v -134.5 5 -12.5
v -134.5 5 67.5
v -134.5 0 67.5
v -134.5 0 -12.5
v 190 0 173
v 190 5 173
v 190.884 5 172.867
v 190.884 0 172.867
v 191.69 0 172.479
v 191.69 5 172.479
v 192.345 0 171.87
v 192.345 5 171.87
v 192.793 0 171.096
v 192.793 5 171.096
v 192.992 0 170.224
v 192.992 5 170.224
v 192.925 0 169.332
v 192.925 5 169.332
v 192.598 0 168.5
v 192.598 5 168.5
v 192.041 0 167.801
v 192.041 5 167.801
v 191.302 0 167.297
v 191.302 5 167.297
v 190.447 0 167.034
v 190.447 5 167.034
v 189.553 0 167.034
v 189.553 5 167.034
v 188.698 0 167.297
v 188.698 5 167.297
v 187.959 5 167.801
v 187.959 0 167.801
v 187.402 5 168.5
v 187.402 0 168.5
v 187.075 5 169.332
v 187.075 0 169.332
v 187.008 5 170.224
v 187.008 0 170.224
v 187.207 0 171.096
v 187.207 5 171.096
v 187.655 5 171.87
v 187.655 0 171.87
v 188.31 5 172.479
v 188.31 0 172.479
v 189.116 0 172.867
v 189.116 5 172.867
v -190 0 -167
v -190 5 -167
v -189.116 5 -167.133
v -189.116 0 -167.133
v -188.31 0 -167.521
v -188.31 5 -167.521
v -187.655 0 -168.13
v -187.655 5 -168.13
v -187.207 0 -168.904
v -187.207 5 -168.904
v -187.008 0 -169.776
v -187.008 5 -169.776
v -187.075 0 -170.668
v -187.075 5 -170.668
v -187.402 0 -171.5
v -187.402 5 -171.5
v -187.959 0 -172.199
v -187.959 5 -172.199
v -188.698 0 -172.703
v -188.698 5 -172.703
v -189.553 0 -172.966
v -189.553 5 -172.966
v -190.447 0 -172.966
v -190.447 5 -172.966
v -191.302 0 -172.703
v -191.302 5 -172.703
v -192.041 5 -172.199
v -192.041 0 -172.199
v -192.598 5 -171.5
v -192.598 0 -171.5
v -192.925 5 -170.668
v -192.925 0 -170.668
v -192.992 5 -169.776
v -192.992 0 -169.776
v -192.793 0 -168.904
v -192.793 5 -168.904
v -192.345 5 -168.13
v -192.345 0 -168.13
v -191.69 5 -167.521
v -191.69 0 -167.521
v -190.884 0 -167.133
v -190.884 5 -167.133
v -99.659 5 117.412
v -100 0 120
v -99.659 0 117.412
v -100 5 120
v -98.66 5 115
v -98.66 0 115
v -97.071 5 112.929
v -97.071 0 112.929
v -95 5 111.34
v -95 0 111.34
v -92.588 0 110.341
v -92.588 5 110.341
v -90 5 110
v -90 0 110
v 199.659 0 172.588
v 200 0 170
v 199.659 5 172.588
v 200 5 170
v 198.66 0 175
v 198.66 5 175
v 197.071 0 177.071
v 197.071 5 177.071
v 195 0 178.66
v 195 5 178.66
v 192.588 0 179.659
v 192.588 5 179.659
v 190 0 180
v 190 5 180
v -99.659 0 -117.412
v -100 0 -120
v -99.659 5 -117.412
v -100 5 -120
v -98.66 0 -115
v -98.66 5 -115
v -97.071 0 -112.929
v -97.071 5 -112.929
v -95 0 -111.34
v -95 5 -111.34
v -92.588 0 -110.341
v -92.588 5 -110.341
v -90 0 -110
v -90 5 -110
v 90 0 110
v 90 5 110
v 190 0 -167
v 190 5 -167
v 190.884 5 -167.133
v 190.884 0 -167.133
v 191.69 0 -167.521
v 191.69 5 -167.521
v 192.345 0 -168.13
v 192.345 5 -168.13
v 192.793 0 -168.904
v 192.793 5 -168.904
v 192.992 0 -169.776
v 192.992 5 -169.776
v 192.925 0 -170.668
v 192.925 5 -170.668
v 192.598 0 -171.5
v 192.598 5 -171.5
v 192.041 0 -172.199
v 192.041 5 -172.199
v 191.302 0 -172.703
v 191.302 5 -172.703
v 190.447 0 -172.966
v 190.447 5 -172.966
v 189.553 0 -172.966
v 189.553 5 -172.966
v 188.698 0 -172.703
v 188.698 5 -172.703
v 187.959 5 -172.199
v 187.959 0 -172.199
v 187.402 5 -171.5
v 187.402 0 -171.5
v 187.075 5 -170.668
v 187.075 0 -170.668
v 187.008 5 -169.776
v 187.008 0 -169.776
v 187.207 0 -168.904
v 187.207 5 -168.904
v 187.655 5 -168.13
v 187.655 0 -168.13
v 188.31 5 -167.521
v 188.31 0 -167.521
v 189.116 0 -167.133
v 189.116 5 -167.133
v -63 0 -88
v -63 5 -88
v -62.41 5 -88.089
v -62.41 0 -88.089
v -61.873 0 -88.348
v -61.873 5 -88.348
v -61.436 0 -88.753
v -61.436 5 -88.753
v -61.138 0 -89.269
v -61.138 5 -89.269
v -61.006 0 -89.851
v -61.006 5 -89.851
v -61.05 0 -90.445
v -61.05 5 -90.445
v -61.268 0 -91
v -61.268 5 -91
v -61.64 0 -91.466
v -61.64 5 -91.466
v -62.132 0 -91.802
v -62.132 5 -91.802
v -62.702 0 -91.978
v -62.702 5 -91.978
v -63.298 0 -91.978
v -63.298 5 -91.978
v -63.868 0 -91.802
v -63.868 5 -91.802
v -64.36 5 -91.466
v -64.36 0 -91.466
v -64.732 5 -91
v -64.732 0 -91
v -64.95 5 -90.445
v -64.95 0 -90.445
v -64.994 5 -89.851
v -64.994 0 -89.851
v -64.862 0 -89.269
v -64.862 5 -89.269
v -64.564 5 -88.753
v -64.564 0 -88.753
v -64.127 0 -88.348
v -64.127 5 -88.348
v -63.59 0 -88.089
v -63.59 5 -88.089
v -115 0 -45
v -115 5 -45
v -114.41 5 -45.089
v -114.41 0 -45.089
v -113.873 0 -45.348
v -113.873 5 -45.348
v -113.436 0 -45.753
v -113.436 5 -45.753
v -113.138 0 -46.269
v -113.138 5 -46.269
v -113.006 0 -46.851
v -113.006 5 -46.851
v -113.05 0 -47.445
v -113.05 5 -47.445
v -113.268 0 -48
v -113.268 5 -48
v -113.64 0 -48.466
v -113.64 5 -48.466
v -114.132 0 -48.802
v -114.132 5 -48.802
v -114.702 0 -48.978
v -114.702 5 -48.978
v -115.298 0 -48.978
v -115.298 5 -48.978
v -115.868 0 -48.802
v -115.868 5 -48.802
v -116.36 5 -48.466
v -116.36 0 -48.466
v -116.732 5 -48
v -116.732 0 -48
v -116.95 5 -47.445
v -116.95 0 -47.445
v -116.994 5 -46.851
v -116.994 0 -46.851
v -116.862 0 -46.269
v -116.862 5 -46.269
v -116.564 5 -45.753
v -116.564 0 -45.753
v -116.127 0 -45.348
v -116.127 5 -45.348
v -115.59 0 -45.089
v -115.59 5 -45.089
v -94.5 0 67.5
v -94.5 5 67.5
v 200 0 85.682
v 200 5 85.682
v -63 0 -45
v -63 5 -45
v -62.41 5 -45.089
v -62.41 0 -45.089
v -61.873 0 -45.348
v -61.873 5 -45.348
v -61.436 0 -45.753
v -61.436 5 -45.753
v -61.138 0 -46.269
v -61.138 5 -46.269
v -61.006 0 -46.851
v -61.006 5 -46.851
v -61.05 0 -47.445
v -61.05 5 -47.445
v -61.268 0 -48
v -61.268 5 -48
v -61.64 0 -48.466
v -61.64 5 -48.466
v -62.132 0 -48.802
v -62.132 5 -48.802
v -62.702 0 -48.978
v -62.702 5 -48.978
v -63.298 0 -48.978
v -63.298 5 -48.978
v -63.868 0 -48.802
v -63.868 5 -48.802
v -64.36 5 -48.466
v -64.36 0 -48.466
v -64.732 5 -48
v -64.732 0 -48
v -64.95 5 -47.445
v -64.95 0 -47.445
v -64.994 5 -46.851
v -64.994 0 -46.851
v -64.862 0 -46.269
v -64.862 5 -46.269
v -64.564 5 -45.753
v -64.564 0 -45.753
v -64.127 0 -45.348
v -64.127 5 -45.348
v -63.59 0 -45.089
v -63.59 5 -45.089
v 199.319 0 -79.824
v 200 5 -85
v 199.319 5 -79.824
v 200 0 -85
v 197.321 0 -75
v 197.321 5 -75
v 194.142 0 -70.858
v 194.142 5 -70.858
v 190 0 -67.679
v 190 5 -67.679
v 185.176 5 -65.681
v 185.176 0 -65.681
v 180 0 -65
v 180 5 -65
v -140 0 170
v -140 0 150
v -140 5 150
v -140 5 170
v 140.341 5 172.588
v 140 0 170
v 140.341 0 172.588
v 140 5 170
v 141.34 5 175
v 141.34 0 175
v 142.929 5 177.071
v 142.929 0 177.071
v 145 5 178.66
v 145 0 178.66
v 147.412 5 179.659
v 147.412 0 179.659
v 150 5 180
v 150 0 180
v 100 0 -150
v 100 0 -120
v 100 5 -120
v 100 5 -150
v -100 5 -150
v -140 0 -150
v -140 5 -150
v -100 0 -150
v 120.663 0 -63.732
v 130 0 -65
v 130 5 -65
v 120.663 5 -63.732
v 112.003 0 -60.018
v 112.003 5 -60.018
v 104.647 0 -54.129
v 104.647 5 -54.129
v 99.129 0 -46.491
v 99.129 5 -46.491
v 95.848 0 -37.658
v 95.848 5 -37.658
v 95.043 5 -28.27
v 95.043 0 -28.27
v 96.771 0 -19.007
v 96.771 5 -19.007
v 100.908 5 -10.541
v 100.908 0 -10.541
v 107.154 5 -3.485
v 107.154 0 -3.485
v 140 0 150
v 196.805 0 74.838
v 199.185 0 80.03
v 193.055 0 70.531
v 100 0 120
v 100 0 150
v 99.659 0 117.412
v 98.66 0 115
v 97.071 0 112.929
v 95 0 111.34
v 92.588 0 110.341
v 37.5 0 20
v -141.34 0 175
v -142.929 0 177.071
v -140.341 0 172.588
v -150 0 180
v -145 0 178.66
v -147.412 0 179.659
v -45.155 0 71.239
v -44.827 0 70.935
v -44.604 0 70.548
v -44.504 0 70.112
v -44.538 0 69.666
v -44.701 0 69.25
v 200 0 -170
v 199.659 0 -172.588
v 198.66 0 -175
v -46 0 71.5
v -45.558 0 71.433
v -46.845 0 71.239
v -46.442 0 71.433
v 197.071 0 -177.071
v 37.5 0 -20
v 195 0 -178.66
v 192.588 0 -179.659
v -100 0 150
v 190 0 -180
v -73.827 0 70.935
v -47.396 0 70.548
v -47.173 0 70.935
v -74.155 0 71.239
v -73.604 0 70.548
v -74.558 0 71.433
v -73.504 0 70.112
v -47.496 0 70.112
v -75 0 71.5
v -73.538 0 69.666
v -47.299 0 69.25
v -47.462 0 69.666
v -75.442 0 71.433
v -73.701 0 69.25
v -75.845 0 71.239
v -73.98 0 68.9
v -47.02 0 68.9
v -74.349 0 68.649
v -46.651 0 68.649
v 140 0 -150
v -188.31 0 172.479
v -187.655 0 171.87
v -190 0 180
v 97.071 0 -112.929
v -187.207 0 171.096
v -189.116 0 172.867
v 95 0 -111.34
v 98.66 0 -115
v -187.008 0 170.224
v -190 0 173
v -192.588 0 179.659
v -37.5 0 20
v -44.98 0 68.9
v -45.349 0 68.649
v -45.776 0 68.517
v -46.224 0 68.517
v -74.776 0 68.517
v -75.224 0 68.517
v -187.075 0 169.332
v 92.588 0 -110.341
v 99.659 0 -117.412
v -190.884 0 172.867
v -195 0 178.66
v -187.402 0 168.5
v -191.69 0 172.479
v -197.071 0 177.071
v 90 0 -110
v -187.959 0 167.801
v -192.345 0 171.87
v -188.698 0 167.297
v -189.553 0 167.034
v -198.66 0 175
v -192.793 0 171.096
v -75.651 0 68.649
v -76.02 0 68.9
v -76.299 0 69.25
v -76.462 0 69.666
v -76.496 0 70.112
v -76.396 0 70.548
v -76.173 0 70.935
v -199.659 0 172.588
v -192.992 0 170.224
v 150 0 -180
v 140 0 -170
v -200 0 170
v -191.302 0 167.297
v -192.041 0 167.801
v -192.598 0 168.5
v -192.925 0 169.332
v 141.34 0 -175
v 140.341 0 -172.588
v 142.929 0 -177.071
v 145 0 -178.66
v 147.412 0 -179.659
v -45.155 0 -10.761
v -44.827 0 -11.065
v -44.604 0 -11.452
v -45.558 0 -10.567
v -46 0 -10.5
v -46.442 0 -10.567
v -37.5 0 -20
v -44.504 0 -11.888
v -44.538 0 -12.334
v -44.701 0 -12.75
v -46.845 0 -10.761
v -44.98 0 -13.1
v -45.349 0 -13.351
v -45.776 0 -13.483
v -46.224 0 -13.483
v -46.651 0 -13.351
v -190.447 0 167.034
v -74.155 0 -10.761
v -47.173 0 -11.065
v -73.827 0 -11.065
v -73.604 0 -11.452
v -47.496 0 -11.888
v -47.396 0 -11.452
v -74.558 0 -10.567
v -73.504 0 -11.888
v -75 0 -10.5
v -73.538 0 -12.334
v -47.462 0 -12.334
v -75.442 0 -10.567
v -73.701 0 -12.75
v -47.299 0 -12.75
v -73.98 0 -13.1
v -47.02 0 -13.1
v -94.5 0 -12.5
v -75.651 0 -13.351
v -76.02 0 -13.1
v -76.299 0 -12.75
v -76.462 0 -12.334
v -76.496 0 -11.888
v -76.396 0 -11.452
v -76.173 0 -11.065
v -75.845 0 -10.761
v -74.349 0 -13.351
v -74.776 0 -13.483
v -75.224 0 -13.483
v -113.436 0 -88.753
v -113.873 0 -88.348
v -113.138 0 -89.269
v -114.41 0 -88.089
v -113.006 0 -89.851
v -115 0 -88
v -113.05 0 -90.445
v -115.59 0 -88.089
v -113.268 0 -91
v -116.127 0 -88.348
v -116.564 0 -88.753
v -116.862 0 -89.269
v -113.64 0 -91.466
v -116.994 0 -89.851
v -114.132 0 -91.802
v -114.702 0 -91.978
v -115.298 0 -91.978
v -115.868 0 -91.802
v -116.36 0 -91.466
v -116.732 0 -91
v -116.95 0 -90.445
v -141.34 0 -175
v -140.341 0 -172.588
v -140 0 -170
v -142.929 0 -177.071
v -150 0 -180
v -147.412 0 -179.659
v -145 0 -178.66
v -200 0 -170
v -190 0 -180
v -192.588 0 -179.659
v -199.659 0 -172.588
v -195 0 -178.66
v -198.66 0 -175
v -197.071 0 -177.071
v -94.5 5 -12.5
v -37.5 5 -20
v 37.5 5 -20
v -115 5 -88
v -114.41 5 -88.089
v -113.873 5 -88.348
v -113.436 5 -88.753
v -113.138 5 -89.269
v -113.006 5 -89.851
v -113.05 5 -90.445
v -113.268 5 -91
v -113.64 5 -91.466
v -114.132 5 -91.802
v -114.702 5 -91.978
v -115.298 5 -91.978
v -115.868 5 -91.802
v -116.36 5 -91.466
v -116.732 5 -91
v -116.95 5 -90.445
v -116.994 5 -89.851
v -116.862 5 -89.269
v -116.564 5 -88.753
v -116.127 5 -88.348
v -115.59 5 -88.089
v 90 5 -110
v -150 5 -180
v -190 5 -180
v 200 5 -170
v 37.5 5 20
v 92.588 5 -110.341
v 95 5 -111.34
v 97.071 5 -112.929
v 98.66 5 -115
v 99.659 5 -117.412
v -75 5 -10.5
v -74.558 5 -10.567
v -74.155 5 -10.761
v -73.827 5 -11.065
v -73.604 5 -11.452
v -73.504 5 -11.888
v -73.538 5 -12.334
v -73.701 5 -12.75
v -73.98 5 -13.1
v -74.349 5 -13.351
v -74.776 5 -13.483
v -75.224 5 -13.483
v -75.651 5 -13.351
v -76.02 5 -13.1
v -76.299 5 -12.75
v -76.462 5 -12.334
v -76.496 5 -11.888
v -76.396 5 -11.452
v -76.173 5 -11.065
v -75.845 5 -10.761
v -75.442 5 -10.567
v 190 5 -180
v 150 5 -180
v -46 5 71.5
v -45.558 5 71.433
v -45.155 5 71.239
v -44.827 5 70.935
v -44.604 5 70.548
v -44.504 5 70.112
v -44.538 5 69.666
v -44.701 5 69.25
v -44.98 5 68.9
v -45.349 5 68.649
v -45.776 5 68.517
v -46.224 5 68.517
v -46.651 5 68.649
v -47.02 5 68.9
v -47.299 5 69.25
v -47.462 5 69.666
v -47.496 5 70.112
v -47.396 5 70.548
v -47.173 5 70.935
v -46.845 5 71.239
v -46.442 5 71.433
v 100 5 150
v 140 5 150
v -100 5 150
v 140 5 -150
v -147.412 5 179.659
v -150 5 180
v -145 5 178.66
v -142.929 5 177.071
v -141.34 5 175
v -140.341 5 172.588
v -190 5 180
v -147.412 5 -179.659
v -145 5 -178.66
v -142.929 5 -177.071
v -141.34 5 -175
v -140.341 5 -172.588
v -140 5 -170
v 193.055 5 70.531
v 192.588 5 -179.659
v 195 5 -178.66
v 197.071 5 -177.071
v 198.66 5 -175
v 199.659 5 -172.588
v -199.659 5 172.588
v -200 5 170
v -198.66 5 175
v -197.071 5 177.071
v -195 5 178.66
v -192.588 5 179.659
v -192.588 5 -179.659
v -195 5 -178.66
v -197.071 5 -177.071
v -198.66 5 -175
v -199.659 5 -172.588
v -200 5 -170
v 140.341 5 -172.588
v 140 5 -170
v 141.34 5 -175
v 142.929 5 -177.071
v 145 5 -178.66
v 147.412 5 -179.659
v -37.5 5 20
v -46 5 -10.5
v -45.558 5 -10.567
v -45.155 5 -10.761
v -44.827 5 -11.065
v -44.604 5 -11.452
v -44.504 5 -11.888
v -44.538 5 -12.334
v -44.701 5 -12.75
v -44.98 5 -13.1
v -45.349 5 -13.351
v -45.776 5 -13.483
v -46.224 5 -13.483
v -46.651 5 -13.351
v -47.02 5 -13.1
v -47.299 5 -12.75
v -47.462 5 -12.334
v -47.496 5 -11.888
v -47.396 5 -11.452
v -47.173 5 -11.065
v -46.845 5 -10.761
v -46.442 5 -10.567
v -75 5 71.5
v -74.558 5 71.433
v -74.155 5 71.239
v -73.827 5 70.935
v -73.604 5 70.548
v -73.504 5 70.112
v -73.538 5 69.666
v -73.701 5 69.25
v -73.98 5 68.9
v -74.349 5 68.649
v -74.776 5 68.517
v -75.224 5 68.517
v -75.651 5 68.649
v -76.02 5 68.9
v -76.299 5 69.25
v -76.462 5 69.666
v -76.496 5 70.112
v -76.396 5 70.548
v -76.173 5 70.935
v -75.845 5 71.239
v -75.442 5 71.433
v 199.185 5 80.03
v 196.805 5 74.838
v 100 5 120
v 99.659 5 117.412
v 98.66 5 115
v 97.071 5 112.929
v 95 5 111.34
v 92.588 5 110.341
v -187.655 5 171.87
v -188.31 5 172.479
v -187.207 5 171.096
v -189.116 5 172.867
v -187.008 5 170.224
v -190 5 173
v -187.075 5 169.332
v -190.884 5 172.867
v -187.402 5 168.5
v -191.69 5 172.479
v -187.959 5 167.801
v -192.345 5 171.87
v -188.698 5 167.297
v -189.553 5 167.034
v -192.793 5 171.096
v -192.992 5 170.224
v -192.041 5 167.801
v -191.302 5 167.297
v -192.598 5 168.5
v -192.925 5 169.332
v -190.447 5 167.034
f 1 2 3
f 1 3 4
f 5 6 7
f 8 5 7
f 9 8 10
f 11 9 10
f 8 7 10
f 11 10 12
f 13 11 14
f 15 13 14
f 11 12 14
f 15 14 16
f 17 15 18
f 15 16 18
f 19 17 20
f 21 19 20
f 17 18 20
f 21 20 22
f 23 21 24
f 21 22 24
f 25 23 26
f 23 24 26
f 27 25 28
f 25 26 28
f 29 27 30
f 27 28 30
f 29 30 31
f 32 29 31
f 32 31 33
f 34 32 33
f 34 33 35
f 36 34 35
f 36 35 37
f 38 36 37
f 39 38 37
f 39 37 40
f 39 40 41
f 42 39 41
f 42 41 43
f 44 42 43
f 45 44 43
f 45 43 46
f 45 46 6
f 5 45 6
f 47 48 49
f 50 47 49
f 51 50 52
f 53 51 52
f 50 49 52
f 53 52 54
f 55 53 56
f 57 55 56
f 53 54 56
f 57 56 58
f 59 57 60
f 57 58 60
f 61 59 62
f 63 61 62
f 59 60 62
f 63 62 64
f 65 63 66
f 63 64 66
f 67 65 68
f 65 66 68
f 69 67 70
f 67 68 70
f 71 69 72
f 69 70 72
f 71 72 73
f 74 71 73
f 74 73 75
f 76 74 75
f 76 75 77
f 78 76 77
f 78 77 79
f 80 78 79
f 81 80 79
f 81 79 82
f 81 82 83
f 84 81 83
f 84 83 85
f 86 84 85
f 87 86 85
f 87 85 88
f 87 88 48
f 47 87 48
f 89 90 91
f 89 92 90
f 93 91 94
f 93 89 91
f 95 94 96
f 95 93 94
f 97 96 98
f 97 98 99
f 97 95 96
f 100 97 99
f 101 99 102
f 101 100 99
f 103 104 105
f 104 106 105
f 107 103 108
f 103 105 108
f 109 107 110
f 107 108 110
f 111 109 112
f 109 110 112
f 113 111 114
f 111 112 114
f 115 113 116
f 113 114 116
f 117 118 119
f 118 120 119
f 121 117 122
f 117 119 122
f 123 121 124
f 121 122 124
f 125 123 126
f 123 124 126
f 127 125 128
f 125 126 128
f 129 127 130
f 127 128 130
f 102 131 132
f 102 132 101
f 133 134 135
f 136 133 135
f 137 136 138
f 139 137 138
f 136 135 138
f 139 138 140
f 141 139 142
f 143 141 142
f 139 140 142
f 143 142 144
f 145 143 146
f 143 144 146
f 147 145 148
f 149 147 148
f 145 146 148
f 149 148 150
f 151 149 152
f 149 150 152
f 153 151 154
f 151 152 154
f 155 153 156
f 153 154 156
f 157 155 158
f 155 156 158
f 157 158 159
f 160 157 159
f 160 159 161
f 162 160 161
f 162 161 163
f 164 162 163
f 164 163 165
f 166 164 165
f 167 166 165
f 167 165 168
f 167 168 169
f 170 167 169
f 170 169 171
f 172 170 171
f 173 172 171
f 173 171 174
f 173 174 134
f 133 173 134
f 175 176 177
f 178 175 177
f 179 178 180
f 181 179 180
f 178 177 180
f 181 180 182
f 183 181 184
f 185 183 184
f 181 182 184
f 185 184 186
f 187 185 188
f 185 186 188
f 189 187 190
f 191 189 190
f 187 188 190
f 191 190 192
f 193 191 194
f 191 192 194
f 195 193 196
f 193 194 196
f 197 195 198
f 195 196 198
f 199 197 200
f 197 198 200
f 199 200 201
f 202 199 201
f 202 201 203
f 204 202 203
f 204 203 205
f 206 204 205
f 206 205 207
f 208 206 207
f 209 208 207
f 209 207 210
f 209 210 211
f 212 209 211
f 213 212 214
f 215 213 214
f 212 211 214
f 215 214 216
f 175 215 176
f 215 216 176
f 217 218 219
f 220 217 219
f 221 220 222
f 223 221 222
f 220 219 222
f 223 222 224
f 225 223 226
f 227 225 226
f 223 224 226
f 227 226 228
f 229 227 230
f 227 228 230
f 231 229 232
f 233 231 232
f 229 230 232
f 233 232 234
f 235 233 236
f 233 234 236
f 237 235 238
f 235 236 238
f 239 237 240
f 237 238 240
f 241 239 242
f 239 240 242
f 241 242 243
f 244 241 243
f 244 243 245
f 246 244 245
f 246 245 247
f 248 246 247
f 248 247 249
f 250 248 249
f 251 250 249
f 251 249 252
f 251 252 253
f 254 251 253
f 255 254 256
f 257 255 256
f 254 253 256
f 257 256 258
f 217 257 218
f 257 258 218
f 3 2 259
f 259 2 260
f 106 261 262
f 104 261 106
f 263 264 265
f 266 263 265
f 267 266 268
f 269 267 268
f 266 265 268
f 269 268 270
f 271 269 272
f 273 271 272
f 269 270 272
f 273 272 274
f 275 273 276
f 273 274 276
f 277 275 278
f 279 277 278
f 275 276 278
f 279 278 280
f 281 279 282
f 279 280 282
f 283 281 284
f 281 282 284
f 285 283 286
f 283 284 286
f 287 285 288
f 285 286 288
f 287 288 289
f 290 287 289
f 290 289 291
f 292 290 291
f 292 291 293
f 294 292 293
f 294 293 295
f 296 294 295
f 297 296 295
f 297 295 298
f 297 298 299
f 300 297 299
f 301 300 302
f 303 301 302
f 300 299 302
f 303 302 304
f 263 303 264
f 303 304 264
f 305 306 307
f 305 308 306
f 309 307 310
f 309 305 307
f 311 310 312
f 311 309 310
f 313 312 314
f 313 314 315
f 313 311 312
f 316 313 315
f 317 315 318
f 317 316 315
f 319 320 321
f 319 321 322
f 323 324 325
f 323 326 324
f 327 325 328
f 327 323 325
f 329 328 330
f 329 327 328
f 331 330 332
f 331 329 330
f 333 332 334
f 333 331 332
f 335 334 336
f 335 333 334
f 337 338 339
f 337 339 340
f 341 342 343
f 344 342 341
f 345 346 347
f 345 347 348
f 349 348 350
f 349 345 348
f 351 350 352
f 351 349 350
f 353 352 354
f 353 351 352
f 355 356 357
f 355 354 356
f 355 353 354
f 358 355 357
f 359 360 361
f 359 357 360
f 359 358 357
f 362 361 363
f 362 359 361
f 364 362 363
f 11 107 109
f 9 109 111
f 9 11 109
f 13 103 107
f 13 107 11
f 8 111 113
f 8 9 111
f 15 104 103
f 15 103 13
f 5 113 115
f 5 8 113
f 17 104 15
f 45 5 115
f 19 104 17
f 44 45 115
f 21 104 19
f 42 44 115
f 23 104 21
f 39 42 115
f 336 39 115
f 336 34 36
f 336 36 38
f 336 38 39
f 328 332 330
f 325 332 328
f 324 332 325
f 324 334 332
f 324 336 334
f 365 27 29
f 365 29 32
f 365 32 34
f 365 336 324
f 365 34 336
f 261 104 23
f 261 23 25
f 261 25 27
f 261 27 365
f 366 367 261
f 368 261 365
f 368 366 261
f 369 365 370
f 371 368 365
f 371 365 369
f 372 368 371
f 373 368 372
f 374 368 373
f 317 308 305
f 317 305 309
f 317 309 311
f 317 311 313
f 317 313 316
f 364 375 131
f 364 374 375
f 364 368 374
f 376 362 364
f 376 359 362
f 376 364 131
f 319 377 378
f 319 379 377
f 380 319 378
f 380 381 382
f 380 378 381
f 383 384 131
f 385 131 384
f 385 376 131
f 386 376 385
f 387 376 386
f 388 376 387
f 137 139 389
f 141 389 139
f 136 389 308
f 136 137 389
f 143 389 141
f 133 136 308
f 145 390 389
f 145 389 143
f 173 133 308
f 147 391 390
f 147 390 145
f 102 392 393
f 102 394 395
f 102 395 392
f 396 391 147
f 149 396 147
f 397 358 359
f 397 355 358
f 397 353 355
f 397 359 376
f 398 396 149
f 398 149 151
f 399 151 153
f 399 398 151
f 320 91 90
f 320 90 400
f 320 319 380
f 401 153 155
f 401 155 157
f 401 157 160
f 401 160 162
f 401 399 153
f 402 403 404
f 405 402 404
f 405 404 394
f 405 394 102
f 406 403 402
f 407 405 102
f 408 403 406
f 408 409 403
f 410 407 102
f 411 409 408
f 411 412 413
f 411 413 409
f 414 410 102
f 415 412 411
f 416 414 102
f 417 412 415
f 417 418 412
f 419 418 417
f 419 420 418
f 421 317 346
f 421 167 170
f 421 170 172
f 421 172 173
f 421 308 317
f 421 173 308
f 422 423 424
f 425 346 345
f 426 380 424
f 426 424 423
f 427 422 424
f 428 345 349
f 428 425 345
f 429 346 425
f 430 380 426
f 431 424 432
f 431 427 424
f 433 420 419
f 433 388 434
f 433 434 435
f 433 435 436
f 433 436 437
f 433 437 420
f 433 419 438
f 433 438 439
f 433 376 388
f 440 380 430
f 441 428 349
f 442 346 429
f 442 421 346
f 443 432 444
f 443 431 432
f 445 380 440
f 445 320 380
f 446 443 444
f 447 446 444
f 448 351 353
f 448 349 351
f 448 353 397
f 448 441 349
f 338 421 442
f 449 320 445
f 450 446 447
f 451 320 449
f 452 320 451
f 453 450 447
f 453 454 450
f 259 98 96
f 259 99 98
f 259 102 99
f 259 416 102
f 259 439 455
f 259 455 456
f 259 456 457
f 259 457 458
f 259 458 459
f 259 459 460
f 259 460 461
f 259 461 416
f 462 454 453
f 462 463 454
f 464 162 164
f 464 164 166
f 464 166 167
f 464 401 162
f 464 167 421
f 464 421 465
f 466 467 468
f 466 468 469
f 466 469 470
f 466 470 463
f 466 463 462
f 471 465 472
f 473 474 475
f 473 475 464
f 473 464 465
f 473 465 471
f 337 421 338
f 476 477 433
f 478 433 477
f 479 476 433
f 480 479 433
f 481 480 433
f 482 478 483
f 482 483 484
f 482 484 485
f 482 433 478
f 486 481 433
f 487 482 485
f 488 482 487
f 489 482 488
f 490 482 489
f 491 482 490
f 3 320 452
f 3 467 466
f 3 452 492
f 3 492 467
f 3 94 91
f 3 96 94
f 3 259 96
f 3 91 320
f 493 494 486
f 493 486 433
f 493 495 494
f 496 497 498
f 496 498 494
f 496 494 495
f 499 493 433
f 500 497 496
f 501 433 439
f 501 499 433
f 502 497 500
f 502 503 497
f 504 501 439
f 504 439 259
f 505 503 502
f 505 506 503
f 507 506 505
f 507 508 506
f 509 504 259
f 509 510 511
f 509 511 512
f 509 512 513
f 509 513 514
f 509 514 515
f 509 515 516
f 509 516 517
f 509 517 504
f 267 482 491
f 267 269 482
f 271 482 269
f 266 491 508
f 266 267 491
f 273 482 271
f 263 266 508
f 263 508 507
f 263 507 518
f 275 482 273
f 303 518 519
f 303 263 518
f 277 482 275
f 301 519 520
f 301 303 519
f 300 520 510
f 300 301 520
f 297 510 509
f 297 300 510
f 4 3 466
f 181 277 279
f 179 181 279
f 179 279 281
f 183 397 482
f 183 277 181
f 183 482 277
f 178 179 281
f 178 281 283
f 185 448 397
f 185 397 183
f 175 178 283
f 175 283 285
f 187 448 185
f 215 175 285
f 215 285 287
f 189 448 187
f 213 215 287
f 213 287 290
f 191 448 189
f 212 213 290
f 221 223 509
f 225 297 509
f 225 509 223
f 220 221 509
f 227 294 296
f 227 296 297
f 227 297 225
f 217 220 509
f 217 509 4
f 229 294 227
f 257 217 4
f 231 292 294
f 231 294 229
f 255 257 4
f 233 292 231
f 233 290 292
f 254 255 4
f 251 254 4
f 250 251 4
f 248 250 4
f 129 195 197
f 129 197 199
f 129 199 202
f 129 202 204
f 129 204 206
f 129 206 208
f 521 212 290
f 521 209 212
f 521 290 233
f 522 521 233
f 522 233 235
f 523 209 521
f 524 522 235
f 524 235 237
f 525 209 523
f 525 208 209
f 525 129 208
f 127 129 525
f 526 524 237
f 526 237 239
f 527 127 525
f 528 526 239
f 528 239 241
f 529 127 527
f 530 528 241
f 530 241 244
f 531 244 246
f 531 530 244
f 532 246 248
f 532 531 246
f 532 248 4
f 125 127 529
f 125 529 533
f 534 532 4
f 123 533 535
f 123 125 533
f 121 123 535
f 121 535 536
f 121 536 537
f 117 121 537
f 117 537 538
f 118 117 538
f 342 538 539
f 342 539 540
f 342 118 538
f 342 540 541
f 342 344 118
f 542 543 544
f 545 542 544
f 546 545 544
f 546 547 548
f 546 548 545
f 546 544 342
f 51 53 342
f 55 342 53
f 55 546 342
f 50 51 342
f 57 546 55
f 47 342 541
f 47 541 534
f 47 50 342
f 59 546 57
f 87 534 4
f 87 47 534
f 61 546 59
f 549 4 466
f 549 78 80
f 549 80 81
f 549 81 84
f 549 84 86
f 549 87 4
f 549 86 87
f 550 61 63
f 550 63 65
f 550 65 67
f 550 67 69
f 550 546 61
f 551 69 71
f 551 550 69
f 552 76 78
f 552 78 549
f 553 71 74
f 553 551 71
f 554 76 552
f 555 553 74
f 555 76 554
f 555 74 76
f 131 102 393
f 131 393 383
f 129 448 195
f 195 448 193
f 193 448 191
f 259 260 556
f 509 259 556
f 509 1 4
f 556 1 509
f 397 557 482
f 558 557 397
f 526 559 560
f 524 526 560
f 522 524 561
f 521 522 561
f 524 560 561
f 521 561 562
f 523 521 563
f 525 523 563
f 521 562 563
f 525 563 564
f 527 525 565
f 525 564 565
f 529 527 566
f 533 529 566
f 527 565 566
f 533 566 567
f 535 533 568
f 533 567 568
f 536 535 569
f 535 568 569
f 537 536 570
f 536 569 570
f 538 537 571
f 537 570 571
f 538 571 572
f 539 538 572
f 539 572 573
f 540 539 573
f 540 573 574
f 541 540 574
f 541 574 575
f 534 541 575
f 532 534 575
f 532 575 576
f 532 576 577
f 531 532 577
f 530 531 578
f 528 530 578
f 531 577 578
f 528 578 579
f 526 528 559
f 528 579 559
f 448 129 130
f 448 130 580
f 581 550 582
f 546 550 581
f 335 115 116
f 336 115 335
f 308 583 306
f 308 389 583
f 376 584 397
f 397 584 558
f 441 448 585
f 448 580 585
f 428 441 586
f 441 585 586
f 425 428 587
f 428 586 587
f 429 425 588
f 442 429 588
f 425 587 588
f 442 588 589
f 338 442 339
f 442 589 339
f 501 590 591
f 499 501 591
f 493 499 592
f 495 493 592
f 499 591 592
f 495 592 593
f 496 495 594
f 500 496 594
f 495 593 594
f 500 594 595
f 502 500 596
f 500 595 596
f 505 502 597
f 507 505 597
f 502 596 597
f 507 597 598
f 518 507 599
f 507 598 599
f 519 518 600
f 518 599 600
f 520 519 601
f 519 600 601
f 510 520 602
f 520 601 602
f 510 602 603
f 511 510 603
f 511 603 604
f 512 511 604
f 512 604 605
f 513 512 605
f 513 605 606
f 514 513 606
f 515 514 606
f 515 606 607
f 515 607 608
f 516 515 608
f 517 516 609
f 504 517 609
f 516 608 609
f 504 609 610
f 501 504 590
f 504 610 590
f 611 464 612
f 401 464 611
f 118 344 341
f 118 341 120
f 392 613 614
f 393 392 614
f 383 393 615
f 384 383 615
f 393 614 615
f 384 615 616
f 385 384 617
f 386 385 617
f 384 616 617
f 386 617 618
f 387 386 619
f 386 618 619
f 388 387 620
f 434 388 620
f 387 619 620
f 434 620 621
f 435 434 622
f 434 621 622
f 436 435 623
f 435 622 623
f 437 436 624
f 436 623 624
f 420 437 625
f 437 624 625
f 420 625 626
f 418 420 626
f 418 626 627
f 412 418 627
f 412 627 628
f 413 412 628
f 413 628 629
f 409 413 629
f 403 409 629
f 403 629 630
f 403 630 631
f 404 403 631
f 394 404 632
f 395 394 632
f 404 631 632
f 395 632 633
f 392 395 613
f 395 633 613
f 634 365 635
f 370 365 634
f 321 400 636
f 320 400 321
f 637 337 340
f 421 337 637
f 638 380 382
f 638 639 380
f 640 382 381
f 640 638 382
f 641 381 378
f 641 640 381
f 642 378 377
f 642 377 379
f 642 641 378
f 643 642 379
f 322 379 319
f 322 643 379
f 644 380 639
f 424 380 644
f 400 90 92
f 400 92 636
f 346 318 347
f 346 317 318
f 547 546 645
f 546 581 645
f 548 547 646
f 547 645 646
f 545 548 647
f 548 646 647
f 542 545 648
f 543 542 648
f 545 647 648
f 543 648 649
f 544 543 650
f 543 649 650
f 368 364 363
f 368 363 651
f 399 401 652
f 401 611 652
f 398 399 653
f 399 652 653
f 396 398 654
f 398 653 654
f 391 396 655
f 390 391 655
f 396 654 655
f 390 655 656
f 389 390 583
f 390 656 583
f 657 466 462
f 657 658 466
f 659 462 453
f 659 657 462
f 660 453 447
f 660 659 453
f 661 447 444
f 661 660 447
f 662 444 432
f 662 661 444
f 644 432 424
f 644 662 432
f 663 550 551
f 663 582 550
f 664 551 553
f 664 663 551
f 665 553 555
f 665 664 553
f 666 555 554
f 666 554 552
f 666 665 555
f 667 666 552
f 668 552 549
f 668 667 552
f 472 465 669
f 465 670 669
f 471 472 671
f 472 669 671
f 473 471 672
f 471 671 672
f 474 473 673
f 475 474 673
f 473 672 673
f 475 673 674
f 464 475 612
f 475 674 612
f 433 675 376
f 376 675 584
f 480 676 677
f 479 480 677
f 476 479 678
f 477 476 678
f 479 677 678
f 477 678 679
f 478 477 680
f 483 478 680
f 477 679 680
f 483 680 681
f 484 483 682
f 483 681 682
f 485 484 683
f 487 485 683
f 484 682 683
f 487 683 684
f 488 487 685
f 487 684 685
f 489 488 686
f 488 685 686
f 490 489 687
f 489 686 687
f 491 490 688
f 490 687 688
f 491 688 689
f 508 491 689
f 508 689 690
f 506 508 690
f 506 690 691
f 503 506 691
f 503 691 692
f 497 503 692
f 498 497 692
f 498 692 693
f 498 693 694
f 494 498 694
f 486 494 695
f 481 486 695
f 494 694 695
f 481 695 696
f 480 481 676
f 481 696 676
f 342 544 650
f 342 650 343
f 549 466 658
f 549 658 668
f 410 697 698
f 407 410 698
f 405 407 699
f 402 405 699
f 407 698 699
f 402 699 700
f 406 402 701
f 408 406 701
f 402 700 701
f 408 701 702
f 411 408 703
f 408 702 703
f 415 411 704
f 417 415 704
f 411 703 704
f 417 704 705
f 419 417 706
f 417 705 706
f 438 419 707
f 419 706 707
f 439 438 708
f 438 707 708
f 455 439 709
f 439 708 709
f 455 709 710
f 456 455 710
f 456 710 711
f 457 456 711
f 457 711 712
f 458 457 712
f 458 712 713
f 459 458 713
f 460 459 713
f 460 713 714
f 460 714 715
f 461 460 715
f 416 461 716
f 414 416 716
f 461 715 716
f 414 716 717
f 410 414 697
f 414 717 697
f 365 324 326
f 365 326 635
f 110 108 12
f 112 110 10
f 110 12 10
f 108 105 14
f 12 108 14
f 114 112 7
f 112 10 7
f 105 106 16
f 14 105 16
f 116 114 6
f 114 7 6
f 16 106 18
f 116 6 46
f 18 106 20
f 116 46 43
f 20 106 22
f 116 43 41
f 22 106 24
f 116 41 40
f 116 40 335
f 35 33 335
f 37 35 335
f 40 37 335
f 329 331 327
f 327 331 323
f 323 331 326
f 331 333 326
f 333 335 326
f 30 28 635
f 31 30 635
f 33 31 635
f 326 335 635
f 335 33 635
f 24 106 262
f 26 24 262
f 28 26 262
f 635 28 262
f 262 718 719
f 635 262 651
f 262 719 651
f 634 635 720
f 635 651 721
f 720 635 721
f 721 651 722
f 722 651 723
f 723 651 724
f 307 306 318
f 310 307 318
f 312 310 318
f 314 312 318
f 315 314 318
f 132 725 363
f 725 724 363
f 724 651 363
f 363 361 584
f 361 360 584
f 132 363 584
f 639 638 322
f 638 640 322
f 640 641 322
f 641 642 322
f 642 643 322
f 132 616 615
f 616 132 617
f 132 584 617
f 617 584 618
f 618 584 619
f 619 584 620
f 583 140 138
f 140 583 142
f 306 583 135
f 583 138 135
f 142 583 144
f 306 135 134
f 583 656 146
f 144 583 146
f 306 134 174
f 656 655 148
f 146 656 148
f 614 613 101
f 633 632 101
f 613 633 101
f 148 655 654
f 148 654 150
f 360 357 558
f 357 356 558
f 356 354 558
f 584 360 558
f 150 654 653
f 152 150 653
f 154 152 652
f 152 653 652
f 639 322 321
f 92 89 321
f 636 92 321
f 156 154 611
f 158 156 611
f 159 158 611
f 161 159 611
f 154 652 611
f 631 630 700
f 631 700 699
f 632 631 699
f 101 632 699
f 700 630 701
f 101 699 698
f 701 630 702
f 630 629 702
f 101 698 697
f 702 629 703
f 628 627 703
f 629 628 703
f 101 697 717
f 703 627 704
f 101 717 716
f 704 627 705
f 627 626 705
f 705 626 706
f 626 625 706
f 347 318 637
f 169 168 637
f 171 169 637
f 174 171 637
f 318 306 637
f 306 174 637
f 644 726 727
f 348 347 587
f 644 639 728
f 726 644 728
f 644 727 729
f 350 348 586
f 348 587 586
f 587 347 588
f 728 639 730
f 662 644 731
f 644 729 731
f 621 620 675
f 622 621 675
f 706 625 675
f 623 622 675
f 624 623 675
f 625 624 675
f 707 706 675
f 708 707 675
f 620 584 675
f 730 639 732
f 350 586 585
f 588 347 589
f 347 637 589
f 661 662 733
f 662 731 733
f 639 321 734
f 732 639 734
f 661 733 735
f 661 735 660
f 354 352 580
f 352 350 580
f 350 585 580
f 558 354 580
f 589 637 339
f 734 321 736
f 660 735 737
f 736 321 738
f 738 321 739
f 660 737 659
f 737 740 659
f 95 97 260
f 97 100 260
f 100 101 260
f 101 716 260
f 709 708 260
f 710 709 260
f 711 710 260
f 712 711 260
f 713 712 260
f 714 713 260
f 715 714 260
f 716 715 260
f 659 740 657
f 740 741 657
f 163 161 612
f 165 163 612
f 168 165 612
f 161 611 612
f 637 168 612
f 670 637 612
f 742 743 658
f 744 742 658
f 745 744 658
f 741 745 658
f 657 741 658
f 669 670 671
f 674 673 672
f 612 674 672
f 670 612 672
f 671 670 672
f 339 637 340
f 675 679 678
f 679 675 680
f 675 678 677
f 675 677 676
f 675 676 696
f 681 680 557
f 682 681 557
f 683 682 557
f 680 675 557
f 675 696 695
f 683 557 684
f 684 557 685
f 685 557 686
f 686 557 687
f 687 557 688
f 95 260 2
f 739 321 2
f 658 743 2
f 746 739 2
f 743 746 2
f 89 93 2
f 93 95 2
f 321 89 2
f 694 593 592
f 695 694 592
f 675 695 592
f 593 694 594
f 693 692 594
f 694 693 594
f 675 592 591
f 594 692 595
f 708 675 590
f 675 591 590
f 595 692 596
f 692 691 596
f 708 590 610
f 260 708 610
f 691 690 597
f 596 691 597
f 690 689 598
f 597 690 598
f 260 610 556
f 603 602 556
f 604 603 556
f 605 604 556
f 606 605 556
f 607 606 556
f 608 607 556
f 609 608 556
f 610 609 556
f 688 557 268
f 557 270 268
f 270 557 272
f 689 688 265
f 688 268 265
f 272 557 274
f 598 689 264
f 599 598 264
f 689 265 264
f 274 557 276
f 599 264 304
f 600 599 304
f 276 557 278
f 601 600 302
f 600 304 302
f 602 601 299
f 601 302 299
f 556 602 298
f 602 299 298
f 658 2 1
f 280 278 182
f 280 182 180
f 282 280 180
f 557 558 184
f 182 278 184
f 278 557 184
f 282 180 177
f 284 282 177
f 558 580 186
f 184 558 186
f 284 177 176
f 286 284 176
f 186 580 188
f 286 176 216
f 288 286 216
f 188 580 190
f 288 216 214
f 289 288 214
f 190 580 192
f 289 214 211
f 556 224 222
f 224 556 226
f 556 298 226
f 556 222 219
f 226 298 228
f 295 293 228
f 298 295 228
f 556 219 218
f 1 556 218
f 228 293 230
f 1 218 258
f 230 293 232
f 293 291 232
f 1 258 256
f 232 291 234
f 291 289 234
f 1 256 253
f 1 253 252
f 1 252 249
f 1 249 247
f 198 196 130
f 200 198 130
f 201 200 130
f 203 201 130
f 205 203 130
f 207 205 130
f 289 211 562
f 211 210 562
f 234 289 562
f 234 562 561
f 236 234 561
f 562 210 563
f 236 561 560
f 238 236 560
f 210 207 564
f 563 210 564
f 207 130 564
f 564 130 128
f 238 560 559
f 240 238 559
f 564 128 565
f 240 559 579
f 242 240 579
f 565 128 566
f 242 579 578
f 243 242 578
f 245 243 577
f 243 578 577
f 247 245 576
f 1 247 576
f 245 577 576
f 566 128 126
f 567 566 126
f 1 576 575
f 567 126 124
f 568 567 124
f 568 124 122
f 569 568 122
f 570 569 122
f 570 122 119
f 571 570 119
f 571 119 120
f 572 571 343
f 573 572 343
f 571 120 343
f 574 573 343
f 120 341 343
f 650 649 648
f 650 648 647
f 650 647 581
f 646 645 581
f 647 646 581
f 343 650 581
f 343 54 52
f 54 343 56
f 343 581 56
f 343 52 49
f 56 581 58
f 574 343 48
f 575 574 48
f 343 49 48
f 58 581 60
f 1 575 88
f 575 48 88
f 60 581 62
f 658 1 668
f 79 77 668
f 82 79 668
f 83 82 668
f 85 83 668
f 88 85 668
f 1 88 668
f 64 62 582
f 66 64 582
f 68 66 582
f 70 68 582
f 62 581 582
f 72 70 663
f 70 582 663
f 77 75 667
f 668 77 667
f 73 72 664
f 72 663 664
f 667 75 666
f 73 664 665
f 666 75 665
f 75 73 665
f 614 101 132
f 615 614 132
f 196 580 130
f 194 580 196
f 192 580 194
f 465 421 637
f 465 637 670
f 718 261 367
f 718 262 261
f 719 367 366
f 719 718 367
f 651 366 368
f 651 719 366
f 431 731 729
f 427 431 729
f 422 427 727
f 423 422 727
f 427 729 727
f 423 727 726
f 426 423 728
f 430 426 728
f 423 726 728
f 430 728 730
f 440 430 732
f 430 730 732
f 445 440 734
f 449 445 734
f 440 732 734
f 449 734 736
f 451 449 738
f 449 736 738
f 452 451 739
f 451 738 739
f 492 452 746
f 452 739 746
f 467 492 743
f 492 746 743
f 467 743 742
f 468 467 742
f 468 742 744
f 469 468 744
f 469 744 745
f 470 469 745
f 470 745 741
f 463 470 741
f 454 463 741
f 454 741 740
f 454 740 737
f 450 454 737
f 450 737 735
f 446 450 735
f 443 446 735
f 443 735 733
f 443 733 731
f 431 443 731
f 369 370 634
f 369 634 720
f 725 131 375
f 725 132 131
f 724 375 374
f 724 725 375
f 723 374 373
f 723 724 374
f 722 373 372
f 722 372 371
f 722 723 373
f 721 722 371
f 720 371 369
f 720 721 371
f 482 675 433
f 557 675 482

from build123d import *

# Parameters (mm, degrees)
SKETCH_4_R                = 15
EXTRUDE_1_DEPTH           = 5
SKETCH_6_R                = 1.5
SKETCH_6_R_2              = 2
SKETCH_6_R_3              = 1.6
SKETCH_6_R_4              = 1.75
CUT_EXTRUDE_2_DEPTH       = 5
SKETCH_8_R                = 3
CUT_EXTRUDE_4_DEPTH       = 10
FILLET_1_R                = 10
CUT_EXTRUDE_24_DEPTH      = 270.118932816
CUT_EXTRUDE_24_DEPTH_BACK = 270.118932816
SKETCH_23_W               = 75
SKETCH_23_H               = 40
SKETCH_23_W_2             = 40
SKETCH_23_H_2             = 80
CUT_EXTRUDE_26_DEPTH      = 270.118932816
FILLET_2_R                = 20


with BuildPart() as part:
    # 草圖4 → 伸長1 (new body)
    with BuildSketch(Plane(origin=(0, 0, 0), x_dir=(1, 0, 0), z_dir=(0, 1, 0))):
        Polygon((-200, 180), (-140, 180), (-140, 150), (-100, 150), (-100, 110), (100, 110), (100, 150), (140, 150), (140, 180), (200, 180), (200, -180), (140, -180), (140, -150), (100, -150), (100, -110), (-100, -110), (-100, -150), (-140, -150), (-140, -180), (-200, -180), align=None)
        with Locations(Location((0, 0, 0), (0, 0, 270))):
            Circle(SKETCH_4_R, mode=Mode.SUBTRACT)
    extrude(amount=EXTRUDE_1_DEPTH)

    # 草圖6 → 伸長2 (cut)
    with BuildSketch(Plane(origin=(0, 5, 0), x_dir=(-1, 0, 0), z_dir=(0, 1, 0))):
        with Locations(Location((75, -12, 0), (0, 0, 90))):
            Circle(SKETCH_6_R)
        with Locations(Location((46, -12, 0), (0, 0, 90))):
            Circle(SKETCH_6_R)
        with Locations(Location((46, 70, 0), (0, 0, 90))):
            Circle(SKETCH_6_R)
        with Locations(Location((75, 70, 0), (0, 0, 90))):
            Circle(SKETCH_6_R)
        with Locations(Location((63, -90, 0), (0, 0, 90))):
            Circle(SKETCH_6_R_2)
        with Locations(Location((115, -90, 0), (0, 0, 90))):
            Circle(SKETCH_6_R_2)
        with Locations(Location((115, -47, 0), (0, 0, 90))):
            Circle(SKETCH_6_R_2)
        with Locations(Location((63, -47, 0), (0, 0, 90))):
            Circle(SKETCH_6_R_2)
        with Locations(Location((130, -10, 0), (0, 0, 90))):
            Circle(SKETCH_6_R_3)
        with Locations(Location((130, 65, 0), (0, 0, 90))):
            Circle(SKETCH_6_R_3)
        with Locations(Location((99, 65, 0), (0, 0, 90))):
            Circle(SKETCH_6_R_3)
        with Locations(Location((99, -10, 0), (0, 0, 90))):
            Circle(SKETCH_6_R_3)
        with Locations(Location((33, 16.5, 0), (0, 0, 90))):
            Circle(SKETCH_6_R_4)
        with Locations(Location((33, -16.5, 0), (0, 0, 90))):
            Circle(SKETCH_6_R_4)
        with Locations(Location((-33, -16.5, 0), (0, 0, 90))):
            Circle(SKETCH_6_R_4)
        with Locations(Location((-33, 16.5, 0), (0, 0, 90))):
            Circle(SKETCH_6_R_4)
    extrude(amount=-CUT_EXTRUDE_2_DEPTH, mode=Mode.SUBTRACT)

    # 草圖8 → 伸長4 (cut)
    with BuildSketch(Plane(origin=(0, 5, 0), x_dir=(1, 0, 0), z_dir=(0, 1, 0))):
        with Locations(Location((190, 170, 0), (0, 0, 270))):
            Circle(SKETCH_8_R)
        with Locations(Location((-190, 170, 0), (0, 0, 270))):
            Circle(SKETCH_8_R)
        with Locations(Location((-190, -170, 0), (0, 0, 270))):
            Circle(SKETCH_8_R)
        with Locations(Location((190, -170, 0), (0, 0, 270))):
            Circle(SKETCH_8_R)
    extrude(amount=-CUT_EXTRUDE_4_DEPTH, mode=Mode.SUBTRACT)

    # 圓角1
    fillet_1_edges = [part.edges().sort_by_distance(p)[0] for p in [
        (-200, 2.5, -180),
        (-140, 2.5, -180),
        (-100, 2.5, -110),
        (100, 2.5, -110),
        (140, 2.5, -180),
        (200, 2.5, -180),
        (200, 2.5, 180),
        (140, 2.5, 180),
        (100, 2.5, 110),
        (-100, 2.5, 110),
        (-140, 2.5, 180),
        (-200, 2.5, 180),
    ]]
    fillet(fillet_1_edges, radius=FILLET_1_R)

    # 草圖21 → 伸長24 (cut, two sides: drawn at the far end of the back side and taken through both)
    with BuildSketch(Plane(origin=(0, 5, 0), x_dir=(1, 0, 0), z_dir=(0, 1, 0)).offset(-CUT_EXTRUDE_24_DEPTH_BACK)):
        with BuildLine():
            Line((1160.368223513, 65), (200, 65))
            Line((200, 65), (130, 65))
            ThreePointArc((130, 65), (97.189752759, 42.185551936), (107.153658755, 3.485010057))
            Line((107.153658755, 3.485010057), (200, -76.514989943))
            Line((200, -76.514989943), (927.547251098, -703.397851531))
            Line((927.547251098, -703.397851531), (2765.756739288, -1260.366770288))
            Line((2765.756739288, -1260.366770288), (2998.577711703, -491.968918756))
            Line((2998.577711703, -491.968918756), (1160.368223513, 65))
        make_face()
    extrude(amount=CUT_EXTRUDE_24_DEPTH + CUT_EXTRUDE_24_DEPTH_BACK, mode=Mode.SUBTRACT)

    # 草圖23 → 伸長26 (cut, through all)
    with BuildSketch(Plane(origin=(0, 5, 0), x_dir=(1, 0, 0), z_dir=(0, 1, 0))):
        Rectangle(SKETCH_23_W, SKETCH_23_H)
        with Locations((-114.5, -27.5)):
            Rectangle(SKETCH_23_W_2, SKETCH_23_H_2)
    extrude(amount=-CUT_EXTRUDE_26_DEPTH, mode=Mode.SUBTRACT)

    # 圓角2
    fillet_2_edges = [part.edges().sort_by_distance(p)[0] for p in [
        (200, 2.5, 76.514989943),
        (200, 2.5, -65),
    ]]
    fillet(fillet_2_edges, radius=FILLET_2_R)


solid = part.part
